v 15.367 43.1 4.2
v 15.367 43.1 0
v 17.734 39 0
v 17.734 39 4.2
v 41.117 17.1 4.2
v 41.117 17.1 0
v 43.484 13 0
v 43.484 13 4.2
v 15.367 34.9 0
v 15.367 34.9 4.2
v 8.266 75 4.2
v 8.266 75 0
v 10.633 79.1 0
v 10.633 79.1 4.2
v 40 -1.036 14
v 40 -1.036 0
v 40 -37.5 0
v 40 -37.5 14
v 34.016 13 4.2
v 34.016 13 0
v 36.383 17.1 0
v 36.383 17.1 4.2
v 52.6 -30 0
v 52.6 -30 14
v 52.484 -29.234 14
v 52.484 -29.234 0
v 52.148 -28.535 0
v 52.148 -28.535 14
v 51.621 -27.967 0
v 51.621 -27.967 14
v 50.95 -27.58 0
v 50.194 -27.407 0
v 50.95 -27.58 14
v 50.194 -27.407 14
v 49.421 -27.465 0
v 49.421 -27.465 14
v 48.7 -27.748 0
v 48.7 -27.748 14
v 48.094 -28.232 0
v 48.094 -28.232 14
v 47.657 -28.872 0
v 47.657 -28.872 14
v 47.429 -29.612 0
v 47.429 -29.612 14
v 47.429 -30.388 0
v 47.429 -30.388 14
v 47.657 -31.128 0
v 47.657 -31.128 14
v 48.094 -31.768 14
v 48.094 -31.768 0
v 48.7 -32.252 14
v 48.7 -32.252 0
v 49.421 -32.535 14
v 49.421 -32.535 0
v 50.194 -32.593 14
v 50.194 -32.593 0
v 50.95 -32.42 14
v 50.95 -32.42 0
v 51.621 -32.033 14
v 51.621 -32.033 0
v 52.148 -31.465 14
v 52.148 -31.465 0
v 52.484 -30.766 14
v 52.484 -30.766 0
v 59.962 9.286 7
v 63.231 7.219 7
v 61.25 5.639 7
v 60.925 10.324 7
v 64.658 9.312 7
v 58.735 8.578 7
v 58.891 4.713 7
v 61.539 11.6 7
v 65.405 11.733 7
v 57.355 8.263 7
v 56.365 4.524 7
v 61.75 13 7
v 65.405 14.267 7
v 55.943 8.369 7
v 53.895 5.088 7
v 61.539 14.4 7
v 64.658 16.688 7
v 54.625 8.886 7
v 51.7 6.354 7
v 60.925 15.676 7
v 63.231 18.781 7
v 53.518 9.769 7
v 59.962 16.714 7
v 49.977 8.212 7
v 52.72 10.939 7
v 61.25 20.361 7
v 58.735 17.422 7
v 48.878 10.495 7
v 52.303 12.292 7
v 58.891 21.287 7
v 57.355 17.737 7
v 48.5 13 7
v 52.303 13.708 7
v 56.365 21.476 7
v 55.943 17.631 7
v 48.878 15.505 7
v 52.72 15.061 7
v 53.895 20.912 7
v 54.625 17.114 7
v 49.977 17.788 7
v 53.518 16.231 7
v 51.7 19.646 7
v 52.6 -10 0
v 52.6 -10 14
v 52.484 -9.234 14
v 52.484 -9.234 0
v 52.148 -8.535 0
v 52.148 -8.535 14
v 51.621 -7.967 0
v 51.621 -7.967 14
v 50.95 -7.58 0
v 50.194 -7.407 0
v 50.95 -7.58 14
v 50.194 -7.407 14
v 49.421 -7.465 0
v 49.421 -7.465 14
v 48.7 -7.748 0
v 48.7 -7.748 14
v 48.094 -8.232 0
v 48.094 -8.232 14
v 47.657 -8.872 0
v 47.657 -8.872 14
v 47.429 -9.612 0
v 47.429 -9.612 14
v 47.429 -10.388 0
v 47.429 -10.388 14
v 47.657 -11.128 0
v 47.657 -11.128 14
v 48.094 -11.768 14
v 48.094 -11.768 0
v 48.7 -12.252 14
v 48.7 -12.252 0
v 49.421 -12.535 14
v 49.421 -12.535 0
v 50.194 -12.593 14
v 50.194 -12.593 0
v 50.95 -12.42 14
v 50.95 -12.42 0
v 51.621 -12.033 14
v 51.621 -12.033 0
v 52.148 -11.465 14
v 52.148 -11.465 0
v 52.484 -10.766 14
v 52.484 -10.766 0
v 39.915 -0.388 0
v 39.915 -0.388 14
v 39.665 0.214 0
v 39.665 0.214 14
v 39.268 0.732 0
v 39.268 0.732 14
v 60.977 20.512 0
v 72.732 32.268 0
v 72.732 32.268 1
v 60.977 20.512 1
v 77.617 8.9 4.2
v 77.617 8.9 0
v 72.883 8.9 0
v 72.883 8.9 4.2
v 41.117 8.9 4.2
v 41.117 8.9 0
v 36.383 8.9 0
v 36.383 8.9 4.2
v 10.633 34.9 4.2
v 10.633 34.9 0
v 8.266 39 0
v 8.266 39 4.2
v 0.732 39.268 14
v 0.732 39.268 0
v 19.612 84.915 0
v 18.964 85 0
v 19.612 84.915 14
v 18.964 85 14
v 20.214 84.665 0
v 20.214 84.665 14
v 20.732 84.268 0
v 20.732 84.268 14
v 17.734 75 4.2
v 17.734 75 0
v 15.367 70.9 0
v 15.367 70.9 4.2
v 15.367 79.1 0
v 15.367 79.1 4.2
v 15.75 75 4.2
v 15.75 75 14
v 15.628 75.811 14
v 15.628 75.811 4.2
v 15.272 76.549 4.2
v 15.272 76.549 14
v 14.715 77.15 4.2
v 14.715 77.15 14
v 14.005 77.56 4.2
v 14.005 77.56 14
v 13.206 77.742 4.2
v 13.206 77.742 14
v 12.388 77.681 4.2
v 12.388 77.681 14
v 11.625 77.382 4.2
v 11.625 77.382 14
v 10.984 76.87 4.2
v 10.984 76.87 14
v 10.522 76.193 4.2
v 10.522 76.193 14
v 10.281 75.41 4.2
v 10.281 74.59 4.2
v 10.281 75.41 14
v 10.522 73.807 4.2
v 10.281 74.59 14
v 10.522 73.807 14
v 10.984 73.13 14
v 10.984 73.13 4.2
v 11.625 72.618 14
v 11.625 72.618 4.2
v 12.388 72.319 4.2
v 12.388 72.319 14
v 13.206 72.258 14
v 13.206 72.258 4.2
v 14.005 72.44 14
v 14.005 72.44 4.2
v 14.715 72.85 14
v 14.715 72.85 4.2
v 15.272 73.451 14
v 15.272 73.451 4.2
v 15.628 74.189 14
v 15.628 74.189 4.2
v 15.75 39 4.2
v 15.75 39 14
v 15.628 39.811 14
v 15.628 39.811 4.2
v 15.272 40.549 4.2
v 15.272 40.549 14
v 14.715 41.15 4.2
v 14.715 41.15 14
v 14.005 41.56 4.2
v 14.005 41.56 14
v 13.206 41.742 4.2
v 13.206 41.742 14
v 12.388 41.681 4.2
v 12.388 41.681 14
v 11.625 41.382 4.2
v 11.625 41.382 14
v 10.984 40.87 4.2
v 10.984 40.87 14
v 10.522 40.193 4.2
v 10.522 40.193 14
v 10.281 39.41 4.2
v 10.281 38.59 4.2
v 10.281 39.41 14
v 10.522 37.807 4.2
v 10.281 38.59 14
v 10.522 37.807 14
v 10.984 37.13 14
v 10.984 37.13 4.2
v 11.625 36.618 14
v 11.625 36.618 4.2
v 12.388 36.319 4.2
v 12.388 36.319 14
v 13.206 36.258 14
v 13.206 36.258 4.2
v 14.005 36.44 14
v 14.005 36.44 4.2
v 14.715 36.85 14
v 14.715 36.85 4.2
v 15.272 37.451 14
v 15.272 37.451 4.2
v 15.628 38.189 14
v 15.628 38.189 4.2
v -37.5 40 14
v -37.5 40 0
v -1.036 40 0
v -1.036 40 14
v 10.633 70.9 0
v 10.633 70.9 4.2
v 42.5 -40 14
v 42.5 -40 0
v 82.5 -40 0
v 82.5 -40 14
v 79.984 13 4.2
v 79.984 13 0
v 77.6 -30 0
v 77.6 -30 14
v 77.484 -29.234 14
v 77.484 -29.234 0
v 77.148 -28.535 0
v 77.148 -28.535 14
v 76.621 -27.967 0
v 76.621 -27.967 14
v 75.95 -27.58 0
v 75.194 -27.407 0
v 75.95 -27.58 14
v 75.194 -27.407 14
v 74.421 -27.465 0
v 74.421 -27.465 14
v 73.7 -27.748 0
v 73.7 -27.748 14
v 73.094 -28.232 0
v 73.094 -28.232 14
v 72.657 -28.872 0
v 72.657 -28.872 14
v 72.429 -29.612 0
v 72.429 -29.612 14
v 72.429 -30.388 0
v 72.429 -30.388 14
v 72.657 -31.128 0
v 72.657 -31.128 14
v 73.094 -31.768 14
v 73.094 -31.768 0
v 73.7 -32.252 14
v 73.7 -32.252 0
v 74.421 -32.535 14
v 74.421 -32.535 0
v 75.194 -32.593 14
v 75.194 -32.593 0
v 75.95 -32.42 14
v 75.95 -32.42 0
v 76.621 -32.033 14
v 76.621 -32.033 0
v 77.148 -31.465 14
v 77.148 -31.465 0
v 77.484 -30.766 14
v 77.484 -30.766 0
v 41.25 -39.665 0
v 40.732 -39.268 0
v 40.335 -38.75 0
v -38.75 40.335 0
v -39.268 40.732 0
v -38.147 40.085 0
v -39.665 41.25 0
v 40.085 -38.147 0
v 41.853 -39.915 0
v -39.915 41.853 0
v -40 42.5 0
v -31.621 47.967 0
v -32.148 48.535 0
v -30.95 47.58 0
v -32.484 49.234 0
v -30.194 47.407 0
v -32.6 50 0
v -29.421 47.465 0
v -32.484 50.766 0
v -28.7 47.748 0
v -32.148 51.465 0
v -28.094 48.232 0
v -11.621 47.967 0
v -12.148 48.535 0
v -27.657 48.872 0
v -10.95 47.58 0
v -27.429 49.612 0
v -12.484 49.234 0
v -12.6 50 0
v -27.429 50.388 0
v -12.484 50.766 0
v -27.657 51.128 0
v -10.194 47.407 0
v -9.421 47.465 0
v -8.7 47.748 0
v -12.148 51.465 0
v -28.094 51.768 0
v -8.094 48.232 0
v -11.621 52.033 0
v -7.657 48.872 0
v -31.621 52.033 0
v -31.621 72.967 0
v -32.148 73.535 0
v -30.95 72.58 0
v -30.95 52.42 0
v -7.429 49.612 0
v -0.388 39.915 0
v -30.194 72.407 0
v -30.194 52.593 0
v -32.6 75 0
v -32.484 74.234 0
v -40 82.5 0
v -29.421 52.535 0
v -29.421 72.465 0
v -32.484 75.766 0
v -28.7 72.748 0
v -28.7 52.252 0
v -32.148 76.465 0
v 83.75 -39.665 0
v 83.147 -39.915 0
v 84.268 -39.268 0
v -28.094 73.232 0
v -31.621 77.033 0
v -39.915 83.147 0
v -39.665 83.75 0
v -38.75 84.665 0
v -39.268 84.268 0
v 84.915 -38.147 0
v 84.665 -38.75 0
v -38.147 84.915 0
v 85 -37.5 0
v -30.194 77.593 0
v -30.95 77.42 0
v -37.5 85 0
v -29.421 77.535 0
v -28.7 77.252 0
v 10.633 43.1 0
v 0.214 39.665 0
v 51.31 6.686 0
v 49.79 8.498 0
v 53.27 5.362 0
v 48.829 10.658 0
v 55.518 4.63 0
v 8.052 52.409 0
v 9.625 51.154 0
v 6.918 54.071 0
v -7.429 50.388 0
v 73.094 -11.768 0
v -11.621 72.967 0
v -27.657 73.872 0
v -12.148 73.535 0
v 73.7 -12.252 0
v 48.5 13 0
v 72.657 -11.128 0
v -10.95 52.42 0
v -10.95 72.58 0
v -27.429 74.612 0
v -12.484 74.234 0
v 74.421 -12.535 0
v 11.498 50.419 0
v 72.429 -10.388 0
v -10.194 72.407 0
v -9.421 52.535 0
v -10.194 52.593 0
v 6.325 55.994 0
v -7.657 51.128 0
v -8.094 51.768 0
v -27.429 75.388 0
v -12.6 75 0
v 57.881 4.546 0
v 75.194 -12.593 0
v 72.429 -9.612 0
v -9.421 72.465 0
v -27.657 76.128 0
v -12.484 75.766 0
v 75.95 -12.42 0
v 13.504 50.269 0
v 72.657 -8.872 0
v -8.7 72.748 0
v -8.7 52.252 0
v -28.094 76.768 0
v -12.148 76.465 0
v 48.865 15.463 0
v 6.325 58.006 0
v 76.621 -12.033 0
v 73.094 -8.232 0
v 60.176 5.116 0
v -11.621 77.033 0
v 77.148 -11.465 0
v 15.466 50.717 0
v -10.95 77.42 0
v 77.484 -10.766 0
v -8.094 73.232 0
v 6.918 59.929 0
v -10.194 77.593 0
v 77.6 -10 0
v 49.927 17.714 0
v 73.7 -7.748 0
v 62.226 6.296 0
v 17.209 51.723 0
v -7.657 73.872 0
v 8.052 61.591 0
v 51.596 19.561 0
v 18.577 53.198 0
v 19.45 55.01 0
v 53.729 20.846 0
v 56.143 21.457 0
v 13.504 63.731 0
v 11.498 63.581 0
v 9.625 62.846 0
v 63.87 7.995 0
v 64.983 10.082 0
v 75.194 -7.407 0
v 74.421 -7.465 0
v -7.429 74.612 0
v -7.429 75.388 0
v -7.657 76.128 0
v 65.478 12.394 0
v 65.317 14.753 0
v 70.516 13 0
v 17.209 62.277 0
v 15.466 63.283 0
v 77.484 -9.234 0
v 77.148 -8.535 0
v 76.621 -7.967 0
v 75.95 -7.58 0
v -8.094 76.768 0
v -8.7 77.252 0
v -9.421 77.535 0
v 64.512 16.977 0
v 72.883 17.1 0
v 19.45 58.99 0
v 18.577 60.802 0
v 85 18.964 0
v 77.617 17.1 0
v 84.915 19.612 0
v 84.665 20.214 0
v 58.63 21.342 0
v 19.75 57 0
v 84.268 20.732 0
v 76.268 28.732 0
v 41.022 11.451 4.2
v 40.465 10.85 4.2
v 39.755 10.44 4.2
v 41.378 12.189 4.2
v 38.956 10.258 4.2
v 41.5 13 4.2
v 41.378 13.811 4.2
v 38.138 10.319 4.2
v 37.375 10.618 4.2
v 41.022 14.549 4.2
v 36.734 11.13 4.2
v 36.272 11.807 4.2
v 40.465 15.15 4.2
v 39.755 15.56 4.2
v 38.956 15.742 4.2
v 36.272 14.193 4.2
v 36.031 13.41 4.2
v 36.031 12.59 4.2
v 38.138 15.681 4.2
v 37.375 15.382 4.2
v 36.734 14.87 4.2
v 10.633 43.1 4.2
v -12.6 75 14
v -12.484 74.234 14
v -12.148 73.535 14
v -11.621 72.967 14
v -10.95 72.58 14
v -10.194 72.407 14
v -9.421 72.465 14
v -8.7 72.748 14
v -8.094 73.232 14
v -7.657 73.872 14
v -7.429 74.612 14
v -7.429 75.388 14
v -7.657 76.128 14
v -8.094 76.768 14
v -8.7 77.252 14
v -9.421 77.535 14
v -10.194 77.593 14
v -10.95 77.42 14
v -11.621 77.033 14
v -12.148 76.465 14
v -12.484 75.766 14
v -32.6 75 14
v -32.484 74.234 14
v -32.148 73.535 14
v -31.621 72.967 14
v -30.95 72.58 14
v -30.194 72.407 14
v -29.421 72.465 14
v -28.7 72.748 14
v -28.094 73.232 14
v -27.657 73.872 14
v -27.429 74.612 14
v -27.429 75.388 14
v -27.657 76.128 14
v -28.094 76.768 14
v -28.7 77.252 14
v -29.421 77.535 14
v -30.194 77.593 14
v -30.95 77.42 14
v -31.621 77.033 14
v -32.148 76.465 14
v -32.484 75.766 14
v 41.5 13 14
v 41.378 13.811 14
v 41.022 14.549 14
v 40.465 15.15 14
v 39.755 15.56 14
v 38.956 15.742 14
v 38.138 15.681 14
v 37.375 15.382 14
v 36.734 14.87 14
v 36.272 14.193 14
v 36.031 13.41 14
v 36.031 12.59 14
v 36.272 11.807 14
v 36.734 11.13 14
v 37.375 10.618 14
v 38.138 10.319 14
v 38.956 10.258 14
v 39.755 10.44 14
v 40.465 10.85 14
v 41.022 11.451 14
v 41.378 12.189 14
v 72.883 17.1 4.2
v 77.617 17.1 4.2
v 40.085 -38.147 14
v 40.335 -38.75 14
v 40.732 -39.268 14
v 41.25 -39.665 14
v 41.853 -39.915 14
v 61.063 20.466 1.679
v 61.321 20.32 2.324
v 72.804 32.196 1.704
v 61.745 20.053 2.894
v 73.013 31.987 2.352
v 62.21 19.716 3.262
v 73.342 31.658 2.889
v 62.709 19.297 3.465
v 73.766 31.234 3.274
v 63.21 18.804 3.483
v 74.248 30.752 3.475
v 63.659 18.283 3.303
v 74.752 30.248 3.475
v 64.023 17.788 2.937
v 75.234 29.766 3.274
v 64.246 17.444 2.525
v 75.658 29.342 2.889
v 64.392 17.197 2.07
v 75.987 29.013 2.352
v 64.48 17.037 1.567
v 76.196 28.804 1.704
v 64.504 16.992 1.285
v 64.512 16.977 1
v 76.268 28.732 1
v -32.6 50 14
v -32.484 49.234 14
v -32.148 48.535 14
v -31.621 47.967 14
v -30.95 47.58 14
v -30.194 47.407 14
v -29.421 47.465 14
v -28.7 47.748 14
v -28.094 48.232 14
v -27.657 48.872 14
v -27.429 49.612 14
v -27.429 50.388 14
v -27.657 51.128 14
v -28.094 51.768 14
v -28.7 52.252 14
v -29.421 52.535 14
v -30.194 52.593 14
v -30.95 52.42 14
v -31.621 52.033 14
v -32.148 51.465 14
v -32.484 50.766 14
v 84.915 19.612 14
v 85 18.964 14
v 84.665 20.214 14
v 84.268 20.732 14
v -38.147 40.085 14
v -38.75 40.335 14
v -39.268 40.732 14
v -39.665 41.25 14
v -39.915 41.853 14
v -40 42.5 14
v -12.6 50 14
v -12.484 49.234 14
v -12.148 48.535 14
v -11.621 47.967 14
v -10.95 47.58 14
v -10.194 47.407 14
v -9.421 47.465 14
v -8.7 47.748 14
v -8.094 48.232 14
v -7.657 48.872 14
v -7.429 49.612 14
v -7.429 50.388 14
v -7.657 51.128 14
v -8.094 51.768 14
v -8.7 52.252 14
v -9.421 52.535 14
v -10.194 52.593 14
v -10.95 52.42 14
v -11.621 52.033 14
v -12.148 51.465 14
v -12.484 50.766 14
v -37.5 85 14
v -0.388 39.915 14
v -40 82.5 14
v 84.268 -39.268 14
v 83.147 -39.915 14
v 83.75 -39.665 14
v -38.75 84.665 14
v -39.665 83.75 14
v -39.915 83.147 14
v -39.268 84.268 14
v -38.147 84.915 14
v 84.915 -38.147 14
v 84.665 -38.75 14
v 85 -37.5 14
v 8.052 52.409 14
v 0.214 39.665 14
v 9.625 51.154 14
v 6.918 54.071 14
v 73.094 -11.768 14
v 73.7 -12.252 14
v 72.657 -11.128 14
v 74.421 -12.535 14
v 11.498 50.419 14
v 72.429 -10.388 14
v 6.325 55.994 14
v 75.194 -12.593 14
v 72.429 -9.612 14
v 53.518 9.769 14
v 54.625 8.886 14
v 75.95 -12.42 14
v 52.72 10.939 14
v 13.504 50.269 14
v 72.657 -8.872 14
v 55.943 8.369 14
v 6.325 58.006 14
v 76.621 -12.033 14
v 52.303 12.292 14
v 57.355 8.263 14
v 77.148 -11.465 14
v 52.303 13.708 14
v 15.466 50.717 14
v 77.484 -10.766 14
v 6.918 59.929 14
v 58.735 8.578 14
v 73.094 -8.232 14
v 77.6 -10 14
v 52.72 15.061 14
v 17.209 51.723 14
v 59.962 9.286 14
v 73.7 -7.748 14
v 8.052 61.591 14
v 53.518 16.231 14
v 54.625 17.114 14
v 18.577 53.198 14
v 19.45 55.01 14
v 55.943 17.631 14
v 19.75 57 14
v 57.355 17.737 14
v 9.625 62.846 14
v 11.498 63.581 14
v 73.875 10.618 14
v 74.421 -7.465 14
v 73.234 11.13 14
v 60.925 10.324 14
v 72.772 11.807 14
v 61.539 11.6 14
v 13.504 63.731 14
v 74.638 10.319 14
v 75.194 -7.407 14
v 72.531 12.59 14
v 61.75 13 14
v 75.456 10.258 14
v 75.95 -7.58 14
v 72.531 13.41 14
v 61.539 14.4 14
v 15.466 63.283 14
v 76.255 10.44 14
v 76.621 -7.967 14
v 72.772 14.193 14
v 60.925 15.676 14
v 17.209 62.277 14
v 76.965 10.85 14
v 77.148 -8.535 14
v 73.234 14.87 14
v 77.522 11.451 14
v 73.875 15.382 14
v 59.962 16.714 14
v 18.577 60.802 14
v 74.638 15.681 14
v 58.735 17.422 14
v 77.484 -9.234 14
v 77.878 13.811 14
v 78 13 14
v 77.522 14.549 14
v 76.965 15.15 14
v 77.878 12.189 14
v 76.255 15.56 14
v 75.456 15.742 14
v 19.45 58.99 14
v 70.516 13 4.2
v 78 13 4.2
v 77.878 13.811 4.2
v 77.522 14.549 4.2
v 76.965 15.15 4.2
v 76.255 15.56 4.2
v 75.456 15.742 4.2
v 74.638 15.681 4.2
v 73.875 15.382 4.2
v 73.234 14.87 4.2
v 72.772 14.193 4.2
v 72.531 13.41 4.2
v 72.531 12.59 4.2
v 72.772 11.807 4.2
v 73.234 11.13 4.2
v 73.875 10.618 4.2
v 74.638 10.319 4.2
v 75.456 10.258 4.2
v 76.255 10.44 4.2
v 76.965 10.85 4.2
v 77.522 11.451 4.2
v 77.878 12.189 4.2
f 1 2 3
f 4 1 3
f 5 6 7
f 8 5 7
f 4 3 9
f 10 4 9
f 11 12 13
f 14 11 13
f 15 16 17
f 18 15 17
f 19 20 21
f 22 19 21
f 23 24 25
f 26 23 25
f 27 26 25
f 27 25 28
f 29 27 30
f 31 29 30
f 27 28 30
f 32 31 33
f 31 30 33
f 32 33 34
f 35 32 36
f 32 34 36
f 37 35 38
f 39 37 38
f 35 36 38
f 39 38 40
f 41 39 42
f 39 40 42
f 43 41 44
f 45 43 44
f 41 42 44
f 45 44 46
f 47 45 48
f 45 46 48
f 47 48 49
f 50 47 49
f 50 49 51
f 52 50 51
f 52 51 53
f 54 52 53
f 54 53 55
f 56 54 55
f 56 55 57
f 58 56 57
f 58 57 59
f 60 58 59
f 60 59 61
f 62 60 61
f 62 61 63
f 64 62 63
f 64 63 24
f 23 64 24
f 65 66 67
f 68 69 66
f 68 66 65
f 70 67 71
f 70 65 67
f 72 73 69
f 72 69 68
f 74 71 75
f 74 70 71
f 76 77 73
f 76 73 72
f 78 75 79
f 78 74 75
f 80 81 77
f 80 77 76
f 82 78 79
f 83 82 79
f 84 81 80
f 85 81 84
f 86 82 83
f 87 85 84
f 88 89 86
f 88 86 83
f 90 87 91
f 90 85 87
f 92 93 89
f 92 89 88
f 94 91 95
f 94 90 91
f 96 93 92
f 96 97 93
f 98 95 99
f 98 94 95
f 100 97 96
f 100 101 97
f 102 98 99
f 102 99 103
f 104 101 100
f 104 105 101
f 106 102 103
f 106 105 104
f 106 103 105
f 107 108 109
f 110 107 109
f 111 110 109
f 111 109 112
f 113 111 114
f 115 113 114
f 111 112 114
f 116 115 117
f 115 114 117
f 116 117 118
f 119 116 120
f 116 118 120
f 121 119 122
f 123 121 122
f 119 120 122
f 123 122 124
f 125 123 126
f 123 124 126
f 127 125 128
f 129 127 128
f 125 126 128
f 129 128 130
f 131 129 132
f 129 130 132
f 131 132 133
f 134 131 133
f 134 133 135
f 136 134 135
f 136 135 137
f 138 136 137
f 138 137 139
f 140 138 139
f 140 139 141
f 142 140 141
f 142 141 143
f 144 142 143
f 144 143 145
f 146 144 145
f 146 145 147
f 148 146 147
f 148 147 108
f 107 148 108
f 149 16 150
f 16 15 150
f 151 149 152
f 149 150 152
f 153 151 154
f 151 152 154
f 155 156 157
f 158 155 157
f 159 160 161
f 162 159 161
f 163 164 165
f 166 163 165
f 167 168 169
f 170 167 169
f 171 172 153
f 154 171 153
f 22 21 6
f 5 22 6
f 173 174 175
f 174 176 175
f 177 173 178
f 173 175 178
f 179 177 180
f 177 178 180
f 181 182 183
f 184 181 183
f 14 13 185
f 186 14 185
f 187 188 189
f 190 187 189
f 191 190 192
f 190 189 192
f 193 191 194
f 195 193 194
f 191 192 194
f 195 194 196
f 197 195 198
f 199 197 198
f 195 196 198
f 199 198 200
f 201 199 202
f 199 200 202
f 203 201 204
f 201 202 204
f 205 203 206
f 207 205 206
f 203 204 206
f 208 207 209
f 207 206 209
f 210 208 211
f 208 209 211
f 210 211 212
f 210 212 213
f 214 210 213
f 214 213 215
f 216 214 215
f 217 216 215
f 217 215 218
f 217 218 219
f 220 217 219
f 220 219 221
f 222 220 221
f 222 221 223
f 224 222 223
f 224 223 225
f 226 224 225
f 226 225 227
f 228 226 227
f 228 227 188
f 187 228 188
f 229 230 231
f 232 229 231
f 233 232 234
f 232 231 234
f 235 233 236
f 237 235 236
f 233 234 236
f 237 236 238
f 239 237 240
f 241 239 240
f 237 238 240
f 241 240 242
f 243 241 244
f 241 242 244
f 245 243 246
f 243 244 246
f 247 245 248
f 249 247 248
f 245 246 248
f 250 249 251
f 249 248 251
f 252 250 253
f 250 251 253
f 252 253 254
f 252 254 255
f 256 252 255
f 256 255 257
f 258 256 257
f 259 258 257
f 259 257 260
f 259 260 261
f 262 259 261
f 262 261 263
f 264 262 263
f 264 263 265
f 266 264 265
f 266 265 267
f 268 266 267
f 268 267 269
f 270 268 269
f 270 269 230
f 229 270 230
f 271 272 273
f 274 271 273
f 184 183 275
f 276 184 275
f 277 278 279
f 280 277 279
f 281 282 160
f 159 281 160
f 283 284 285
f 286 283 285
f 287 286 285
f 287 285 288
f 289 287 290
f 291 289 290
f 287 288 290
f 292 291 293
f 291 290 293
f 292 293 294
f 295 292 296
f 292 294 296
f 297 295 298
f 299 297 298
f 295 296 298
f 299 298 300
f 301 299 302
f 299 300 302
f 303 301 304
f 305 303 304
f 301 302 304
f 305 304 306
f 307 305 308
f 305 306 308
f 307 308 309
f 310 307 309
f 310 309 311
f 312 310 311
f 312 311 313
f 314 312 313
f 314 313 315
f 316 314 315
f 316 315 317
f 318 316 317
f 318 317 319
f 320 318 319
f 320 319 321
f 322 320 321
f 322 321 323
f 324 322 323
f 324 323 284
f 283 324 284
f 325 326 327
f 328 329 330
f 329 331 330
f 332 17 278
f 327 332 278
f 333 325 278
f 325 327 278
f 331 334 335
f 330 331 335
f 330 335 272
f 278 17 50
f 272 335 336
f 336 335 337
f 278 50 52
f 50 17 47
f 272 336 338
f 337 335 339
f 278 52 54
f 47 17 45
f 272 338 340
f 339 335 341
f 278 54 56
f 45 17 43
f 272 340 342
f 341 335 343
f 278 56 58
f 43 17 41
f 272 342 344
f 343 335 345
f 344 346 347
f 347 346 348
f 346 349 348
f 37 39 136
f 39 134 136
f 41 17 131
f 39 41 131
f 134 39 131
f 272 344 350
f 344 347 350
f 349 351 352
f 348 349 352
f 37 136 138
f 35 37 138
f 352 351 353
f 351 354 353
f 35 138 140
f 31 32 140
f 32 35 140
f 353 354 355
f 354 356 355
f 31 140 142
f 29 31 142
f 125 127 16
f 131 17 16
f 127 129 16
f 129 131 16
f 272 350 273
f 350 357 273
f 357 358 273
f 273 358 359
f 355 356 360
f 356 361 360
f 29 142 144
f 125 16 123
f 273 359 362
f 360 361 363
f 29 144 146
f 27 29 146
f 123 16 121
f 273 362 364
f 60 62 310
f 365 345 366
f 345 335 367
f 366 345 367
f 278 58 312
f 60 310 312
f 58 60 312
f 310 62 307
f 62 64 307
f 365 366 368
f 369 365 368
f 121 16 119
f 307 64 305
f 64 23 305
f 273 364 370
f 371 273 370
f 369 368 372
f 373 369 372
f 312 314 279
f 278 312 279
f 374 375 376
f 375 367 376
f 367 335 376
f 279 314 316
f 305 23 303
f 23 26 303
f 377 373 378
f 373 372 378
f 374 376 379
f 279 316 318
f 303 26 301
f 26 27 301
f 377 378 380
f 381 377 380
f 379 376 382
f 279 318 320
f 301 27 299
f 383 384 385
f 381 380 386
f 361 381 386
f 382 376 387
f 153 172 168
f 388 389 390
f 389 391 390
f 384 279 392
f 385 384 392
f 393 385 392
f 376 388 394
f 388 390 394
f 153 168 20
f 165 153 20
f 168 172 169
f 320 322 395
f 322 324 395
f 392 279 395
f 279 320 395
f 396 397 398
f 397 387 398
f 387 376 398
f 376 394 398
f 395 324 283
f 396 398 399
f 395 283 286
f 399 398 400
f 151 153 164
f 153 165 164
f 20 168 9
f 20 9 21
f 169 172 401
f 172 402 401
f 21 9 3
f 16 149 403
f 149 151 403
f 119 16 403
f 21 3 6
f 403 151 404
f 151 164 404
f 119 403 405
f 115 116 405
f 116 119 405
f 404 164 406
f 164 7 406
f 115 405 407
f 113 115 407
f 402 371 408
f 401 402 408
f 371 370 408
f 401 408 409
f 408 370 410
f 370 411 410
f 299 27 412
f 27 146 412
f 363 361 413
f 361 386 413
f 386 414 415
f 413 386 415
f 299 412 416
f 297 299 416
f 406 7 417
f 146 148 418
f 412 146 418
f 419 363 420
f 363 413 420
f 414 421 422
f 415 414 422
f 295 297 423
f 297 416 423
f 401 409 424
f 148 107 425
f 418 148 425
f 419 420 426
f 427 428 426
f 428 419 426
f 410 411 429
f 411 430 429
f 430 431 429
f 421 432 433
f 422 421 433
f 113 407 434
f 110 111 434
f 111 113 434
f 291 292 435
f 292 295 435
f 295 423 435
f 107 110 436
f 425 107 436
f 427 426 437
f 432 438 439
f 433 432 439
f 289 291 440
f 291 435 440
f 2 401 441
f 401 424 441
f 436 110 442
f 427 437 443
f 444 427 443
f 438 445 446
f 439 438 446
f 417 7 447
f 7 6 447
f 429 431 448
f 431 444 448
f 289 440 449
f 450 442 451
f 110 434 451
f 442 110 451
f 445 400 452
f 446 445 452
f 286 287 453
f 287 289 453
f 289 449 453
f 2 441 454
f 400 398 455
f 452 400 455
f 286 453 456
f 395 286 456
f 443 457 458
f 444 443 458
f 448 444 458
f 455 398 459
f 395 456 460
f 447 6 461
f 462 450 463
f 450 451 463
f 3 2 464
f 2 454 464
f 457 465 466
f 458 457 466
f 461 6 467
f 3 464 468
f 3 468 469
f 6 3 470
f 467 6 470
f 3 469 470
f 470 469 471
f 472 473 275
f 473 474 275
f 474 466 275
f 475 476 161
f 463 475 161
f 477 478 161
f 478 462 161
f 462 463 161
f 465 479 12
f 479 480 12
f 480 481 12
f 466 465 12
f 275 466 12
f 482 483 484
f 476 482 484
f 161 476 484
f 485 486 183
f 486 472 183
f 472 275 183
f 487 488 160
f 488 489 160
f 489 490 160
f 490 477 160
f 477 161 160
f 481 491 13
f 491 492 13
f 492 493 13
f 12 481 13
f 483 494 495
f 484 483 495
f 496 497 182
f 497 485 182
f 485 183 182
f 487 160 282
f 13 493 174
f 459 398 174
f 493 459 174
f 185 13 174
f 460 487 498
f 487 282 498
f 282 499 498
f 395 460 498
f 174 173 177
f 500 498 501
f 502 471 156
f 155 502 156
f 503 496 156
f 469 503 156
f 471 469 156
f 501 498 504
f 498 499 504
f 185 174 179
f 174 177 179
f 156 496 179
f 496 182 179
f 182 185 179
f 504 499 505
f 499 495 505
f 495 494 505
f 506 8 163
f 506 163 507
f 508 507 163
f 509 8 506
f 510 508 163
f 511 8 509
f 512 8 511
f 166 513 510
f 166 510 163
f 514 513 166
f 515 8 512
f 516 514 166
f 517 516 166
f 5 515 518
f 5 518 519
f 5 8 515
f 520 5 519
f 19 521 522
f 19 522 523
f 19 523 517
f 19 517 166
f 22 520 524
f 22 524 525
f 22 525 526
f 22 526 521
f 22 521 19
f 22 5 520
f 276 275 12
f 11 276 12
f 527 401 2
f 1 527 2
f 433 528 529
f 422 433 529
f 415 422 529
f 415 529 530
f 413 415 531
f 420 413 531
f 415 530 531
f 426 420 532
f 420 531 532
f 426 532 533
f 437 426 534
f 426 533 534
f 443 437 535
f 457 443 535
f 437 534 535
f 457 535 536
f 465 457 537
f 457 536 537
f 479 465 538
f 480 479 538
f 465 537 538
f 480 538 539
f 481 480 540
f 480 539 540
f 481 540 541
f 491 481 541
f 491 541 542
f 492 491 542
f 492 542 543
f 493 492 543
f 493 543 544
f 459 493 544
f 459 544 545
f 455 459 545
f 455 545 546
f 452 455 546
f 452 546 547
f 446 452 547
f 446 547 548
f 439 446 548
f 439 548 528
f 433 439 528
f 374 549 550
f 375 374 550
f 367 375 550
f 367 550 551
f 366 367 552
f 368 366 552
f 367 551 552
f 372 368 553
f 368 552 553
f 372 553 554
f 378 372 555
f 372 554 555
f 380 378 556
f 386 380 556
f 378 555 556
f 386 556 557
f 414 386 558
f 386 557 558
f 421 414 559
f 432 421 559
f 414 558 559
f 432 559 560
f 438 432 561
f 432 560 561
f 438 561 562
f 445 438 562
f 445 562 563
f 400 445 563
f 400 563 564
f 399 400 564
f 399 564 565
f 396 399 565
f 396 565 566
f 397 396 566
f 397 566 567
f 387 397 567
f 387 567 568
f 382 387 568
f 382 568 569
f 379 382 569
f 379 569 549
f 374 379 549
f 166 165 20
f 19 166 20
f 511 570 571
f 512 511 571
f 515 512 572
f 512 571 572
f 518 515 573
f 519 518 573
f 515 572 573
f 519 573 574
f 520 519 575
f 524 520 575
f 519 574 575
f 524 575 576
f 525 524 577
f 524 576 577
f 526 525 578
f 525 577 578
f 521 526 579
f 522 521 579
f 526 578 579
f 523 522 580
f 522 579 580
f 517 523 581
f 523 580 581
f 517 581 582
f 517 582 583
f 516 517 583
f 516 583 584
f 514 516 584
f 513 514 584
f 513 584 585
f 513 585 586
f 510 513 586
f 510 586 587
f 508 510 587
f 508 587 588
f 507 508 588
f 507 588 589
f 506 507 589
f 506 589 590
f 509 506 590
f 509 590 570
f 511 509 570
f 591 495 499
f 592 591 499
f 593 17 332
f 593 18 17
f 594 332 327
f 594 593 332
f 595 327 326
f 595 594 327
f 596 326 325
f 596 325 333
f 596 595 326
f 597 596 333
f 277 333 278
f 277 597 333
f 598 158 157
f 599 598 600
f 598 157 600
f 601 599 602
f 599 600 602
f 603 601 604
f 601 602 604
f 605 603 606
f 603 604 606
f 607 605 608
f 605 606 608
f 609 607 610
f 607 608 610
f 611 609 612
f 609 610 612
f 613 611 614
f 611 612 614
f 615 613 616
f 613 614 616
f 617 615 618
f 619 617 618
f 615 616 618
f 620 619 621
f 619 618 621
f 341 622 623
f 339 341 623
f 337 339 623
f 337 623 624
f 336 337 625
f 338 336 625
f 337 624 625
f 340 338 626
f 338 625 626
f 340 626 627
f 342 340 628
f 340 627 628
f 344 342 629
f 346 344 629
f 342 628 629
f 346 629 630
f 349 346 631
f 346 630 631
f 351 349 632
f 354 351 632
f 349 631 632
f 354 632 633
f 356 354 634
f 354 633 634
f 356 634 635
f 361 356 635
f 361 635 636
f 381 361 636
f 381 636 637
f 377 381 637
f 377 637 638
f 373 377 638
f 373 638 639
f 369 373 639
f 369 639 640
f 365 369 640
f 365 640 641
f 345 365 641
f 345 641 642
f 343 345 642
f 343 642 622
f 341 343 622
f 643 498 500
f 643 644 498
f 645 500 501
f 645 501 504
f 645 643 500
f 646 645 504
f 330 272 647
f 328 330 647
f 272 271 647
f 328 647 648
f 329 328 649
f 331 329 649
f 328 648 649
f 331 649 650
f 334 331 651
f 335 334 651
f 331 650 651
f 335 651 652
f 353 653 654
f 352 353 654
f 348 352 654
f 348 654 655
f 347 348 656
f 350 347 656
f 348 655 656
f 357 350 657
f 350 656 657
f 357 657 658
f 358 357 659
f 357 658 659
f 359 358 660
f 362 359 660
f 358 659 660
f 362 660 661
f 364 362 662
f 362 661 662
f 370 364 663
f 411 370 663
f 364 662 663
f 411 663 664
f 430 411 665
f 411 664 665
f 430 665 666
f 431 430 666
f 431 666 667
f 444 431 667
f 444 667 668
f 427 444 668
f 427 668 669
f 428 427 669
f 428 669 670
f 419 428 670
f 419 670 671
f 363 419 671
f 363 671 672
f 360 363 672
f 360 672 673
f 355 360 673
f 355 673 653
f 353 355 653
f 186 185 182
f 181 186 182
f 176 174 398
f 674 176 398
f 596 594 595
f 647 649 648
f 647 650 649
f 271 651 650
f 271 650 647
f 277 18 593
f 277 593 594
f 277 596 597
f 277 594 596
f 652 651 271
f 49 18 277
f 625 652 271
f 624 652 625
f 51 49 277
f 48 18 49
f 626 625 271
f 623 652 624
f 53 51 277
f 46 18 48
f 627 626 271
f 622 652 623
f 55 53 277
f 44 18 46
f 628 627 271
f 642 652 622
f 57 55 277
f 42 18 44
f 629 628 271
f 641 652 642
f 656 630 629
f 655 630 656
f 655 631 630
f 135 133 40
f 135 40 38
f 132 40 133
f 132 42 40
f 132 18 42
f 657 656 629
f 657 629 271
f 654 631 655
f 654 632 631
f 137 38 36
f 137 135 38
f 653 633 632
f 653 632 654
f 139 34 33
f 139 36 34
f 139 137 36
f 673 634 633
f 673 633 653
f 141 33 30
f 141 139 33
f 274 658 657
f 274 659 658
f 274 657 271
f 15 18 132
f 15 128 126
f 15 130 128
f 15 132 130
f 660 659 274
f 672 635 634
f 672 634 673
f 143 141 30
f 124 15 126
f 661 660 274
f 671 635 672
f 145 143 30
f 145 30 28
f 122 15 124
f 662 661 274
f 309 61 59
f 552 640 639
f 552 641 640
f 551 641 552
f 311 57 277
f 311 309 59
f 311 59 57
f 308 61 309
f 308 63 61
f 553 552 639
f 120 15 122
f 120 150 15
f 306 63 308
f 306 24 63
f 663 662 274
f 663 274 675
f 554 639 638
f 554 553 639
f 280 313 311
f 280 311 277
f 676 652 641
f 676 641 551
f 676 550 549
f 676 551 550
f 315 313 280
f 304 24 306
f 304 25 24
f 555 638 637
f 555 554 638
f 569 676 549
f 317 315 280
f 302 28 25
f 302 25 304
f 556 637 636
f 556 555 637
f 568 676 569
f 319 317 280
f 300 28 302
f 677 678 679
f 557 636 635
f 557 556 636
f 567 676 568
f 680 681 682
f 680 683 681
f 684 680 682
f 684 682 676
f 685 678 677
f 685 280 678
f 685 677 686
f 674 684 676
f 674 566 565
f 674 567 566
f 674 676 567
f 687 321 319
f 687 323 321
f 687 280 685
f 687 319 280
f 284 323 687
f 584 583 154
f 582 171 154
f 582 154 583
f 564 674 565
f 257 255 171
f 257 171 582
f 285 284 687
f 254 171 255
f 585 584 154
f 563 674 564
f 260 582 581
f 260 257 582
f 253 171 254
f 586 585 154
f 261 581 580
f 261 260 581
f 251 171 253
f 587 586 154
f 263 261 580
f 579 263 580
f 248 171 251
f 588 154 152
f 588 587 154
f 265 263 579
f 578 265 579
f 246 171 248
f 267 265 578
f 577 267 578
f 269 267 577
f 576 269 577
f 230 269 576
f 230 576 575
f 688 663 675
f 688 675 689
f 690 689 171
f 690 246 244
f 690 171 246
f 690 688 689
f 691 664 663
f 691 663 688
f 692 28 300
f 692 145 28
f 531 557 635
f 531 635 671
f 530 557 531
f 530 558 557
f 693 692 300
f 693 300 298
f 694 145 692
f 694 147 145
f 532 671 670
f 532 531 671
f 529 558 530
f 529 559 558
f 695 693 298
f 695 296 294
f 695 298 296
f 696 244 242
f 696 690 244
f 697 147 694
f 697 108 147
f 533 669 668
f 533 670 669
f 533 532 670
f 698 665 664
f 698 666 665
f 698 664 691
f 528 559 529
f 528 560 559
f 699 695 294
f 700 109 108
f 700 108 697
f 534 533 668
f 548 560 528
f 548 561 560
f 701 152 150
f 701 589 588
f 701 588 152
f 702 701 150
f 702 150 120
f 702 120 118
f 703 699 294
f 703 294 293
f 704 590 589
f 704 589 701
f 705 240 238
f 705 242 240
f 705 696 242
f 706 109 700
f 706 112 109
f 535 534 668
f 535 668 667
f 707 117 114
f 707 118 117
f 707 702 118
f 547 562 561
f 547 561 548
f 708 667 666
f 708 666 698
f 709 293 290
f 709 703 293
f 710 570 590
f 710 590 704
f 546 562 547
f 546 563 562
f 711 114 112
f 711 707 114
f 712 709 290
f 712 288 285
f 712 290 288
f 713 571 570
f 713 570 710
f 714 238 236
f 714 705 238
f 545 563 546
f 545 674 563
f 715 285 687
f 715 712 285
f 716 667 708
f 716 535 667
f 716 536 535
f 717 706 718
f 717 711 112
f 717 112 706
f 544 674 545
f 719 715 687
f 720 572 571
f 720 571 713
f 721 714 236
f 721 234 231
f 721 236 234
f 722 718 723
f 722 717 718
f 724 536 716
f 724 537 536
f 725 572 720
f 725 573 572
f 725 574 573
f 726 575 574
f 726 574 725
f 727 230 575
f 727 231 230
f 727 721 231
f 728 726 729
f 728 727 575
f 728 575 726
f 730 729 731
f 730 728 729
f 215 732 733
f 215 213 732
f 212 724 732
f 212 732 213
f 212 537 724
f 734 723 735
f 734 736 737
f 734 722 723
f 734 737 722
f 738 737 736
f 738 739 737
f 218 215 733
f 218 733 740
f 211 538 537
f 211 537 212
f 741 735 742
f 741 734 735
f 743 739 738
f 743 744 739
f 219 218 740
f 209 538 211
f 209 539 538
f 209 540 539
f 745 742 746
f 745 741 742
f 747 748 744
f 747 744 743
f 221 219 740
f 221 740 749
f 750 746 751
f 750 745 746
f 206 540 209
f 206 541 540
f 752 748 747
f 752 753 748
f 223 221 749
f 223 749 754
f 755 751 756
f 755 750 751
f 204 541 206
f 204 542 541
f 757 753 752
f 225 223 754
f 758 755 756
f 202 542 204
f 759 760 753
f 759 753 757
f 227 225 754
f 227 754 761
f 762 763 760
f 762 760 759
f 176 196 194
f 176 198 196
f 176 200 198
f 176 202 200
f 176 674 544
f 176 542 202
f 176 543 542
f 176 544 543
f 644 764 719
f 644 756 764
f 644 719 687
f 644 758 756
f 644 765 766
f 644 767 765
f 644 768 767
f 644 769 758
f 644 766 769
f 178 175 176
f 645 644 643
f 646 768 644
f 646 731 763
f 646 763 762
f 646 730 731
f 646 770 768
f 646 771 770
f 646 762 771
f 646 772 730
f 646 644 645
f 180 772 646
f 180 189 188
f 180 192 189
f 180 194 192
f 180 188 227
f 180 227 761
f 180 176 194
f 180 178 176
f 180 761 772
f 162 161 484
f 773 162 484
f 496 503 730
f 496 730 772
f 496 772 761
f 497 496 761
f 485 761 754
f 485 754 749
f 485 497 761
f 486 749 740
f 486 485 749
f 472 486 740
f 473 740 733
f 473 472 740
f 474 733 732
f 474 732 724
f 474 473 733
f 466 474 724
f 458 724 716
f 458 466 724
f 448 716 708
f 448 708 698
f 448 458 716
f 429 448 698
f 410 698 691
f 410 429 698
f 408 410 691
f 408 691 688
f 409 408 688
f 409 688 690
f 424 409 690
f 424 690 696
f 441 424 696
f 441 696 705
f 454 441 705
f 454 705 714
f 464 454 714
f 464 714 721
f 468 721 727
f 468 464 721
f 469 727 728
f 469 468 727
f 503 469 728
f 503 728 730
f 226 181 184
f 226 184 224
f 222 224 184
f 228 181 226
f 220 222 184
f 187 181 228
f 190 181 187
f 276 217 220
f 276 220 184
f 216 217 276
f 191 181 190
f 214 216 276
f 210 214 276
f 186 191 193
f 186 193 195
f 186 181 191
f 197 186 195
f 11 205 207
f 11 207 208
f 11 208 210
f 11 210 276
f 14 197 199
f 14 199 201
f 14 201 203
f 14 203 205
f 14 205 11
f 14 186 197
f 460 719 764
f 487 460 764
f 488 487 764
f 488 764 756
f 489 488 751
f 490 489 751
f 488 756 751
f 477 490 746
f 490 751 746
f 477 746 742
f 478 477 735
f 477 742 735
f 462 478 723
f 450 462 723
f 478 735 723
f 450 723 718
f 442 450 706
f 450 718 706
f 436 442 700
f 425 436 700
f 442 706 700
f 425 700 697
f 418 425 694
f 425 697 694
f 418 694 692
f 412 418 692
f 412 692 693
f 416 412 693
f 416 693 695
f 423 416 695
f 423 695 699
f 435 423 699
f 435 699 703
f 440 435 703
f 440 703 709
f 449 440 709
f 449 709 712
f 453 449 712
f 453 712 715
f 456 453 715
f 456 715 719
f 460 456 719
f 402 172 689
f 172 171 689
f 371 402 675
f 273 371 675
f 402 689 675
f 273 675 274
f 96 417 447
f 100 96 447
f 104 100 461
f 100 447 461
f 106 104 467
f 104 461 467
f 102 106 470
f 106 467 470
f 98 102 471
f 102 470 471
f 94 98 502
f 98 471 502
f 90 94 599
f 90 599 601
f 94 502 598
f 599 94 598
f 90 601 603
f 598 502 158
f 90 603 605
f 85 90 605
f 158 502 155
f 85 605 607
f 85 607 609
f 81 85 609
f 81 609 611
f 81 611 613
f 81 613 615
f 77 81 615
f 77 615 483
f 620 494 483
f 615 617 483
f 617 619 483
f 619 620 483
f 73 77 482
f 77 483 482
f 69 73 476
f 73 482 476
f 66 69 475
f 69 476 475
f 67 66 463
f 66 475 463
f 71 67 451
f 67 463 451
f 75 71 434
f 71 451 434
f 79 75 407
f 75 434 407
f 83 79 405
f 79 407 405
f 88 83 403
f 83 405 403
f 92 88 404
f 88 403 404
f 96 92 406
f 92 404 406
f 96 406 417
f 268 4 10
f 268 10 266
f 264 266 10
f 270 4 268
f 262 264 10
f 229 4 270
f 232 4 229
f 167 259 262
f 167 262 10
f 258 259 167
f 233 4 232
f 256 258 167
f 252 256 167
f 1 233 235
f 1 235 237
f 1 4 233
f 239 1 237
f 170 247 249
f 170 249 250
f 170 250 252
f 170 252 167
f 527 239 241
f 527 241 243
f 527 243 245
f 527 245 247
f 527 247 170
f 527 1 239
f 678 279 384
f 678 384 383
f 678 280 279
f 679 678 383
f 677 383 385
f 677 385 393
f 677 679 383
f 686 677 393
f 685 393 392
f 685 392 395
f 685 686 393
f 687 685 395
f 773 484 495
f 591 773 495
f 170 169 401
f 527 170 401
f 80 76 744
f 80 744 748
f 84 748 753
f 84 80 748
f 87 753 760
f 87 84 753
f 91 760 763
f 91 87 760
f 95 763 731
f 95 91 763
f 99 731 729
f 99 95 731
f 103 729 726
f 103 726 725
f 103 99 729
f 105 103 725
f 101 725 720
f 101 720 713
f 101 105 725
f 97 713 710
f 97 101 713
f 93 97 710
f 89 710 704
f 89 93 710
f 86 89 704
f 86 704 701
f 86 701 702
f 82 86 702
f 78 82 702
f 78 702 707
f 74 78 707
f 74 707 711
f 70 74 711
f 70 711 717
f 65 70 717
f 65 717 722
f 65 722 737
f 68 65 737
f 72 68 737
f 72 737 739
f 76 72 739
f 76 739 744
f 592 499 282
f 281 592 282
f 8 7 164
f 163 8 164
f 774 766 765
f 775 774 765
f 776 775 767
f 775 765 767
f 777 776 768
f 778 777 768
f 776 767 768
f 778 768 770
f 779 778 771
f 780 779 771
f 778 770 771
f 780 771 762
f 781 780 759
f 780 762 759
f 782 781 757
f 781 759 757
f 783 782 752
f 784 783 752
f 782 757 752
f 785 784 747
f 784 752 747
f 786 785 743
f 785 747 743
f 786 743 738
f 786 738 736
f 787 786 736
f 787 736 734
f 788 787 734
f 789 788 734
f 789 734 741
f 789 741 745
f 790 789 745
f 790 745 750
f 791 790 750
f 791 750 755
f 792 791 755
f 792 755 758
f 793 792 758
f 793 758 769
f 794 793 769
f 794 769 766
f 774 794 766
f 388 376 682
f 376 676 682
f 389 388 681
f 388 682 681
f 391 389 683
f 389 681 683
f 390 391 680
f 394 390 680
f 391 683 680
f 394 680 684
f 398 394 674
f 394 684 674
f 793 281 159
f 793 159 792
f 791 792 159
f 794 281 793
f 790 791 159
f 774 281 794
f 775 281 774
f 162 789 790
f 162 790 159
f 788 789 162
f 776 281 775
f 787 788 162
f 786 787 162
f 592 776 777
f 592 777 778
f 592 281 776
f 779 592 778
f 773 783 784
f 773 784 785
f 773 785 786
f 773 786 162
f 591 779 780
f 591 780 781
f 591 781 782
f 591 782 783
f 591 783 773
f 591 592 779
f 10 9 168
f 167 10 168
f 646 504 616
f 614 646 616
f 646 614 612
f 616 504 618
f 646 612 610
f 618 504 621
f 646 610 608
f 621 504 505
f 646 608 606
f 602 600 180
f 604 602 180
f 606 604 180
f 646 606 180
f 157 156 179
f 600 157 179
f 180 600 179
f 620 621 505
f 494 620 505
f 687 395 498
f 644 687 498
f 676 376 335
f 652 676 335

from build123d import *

# Parameters (mm, degrees)
SKETCH_1_R                = 6.75
SKETCH_1_R_2              = 4.75
EXTRUDE_2_DEPTH           = 14
SKETCH_7_R                = 2.75
CUT_EXTRUDE_6_DEPTH       = 122.020659393
CUT_EXTRUDE_7_DEPTH       = 4.2
SKETCH_11_R               = 2.6
CUT_EXTRUDE_10_DEPTH      = 122.020659393
SKETCH_12_R               = 8.5
CUT_EXTRUDE_11_DEPTH      = 7
CUT_EXTRUDE_12_REACH      = 133.562
CUT_EXTRUDE_12_END_RADIUS = 8.5
FILLET_1_R                = 2.5


with BuildPart() as part:
    # Эскиз1 → Бобышка-Вытянуть2 (new body)
    with BuildSketch(Plane.XY):
        Polygon((40, 0), (40, -40), (85, -40), (85, 20), (20, 85), (-40, 85), (-40, 40), (0, 40), align=None)
        with Locations((13, 57)):
            Circle(SKETCH_1_R, mode=Mode.SUBTRACT)
        with Locations((57, 13)):
            Circle(SKETCH_1_R_2, mode=Mode.SUBTRACT)
    extrude(amount=EXTRUDE_2_DEPTH)

    # Эскиз7 → Вырез-Вытянуть6 (cut, through all)
    with BuildSketch(Plane.XY.offset(14)):
        with Locations((13, 39)):
            Circle(SKETCH_7_R)
        with Locations((13, 75)):
            Circle(SKETCH_7_R)
        with Locations((38.75, 13)):
            Circle(SKETCH_7_R)
        with Locations((75.25, 13)):
            Circle(SKETCH_7_R)
    extrude(amount=-CUT_EXTRUDE_6_DEPTH, mode=Mode.SUBTRACT)

    # Эскиз8 → Вырез-Вытянуть7 (cut)
    with BuildSketch(Plane(origin=(0, 0, 0), x_dir=(-1, 0, 0), z_dir=(0, 0, -1))):
        Polygon((-17.734272207, 75), (-15.367136104, 70.9), (-10.632863896, 70.9), (-8.265727793, 75), (-10.632863896, 79.1), (-15.367136104, 79.1), align=None)
        Polygon((-17.734272207, 39), (-15.367136104, 34.9), (-10.632863896, 34.9), (-8.265727793, 39), (-10.632863896, 43.1), (-15.367136104, 43.1), align=None)
        Polygon((-34.015727793, 13), (-36.382863896, 17.1), (-41.117136104, 17.1), (-43.484272207, 13), (-41.117136104, 8.9), (-36.382863896, 8.9), align=None)
        Polygon((-70.515727793, 13), (-72.882863896, 17.1), (-77.617136104, 17.1), (-79.984272207, 13), (-77.617136104, 8.9), (-72.882863896, 8.9), align=None)
    extrude(amount=-CUT_EXTRUDE_7_DEPTH, mode=Mode.SUBTRACT)

    # Эскиз11 → Вырез-Вытянуть10 (cut, through all)
    with BuildSketch(Plane.XY.offset(14)):
        with Locations((50, -30)):
            Circle(SKETCH_11_R)
        with Locations((75, -30)):
            Circle(SKETCH_11_R)
        with Locations((75, -10)):
            Circle(SKETCH_11_R)
        with Locations((50, -10)):
            Circle(SKETCH_11_R)
        with Locations(Location((-10, 50, 0), (0, 0, 180))):
            Circle(SKETCH_11_R)
        with Locations(Location((-30, 50, 0), (0, 0, 180))):
            Circle(SKETCH_11_R)
        with Locations(Location((-30, 75, 0), (0, 0, 180))):
            Circle(SKETCH_11_R)
        with Locations(Location((-10, 75, 0), (0, 0, 180))):
            Circle(SKETCH_11_R)
    extrude(amount=-CUT_EXTRUDE_10_DEPTH, mode=Mode.SUBTRACT)

    # Эскиз12 → Вырез-Вытянуть11 (cut)
    with BuildSketch(Plane(origin=(0, 0, 0), x_dir=(-1, 0, 0), z_dir=(0, 0, -1))):
        with Locations((-57, 13)):
            Circle(SKETCH_12_R)
    extrude(amount=-CUT_EXTRUDE_11_DEPTH, mode=Mode.SUBTRACT)

    # Вырез-Вытянуть12: up to this cylinder (the profile starts outside it)
    cut_extrude_12_end = Plane(origin=(57, 13, 1.534279), z_dir=(0, 0, -1)) * Cylinder(CUT_EXTRUDE_12_END_RADIUS, 285.124, mode=Mode.PRIVATE)
    # Эскиз13 → Вырез-Вытянуть12 (cut, up to the surface)
    with BuildSketch(Plane(origin=(52.5, 52.5, 0), x_dir=(0, 0, -1), z_dir=(0.7071067811865477, 0.7071067811865474, 0)), mode=Mode.PRIVATE) as cut_extrude_12_sk1:
        with BuildLine():
            Line((-1, -33.612698372), (0, -33.612698372))
            Line((0, -33.612698372), (0, -28.612698372))
            Line((0, -28.612698372), (-1, -28.612698372))
            ThreePointArc((-1, -28.612698372), (-3.5, -31.112698372), (-1, -33.612698372))
        make_face()
    cut_extrude_12_tool1 = extrude(cut_extrude_12_sk1.sketch, amount=-CUT_EXTRUDE_12_REACH, mode=Mode.PRIVATE) - cut_extrude_12_end
    add(cut_extrude_12_tool1.solids().sort_by_distance((74.5, 30.5, 1.534279))[0], mode=Mode.SUBTRACT)

    # Скругление1
    fillet_1_edges = [part.edges().sort_by_distance(p)[0] for p in [
        (0, 40, 7),
        (-40, 40, 7),
        (-40, 85, 7),
        (20, 85, 7),
        (85, 20, 7),
        (85, -40, 7),
        (40, -40, 7),
        (40, 0, 7),
    ]]
    fillet(fillet_1_edges, radius=FILLET_1_R)


solid = part.part
